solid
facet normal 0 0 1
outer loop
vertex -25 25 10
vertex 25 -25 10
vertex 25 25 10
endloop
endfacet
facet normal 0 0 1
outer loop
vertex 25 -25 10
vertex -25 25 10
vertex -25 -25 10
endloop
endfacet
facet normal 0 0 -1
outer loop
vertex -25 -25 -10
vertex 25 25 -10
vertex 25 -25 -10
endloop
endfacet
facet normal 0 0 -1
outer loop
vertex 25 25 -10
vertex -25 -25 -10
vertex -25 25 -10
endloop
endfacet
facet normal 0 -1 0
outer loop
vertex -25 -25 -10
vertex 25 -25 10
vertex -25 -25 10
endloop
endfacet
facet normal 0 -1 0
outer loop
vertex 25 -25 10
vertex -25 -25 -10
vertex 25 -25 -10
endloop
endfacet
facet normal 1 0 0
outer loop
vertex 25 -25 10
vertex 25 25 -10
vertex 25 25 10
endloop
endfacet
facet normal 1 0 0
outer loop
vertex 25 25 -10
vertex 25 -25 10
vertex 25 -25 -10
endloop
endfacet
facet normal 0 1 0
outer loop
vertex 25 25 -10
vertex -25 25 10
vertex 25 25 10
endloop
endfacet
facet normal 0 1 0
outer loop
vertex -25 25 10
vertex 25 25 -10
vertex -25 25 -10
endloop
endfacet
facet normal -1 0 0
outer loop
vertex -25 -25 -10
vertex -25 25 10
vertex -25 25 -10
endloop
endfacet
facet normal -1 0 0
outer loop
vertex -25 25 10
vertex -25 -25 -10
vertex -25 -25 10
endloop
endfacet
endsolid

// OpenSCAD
// Basic Project Scaffold for 3D Printing
// This template provides a starting point for beginner projects
// Complete the TODO sections to create your own design

// ============================================
// PROJECT CONFIGURATION
// ============================================

// TODO: Set your project name
project_name = "My First Project";

// TODO: Define overall dimensions (mm)
object_width = 50;
object_depth = 50;
object_height = 20;

// Wall thickness for strength (2-3mm recommended)
wall_thickness = 2;

// ============================================
// MATERIAL PROPERTIES
// ============================================

// Print resolution (0.2mm layers recommended)
$fn = 30;  // Fragment quality (higher = smoother curves, slower rendering)

// ============================================
// MAIN DESIGN
// ============================================

module base_shape() {
    // TODO: Replace this cube with your design
    cube([object_width, object_depth, object_height], center = true);
}

module hollow_version() {
    // Creates a hollow version by subtracting an inner cube
    difference() {
        base_shape();
        
        // Inner void (adjust padding as needed)
        translate([0, 0, 0.5])
            cube([object_width - 2*wall_thickness, 
                  object_depth - 2*wall_thickness, 
                  object_height - 2*wall_thickness], 
                 center = true);
    }
}

// ============================================
// OUTPUT OPTIONS
// ============================================

// TODO: Uncomment one of these to see different versions:

// Solid version
base_shape();

// Hollow version (useful for reducing material)
// hollow_version();

// ============================================
// CUSTOMIZATION TIPS
// ============================================
// 1. Test print at small scale first
// 2. Add support structures if needed
// 3. Use wall_thickness variable for quick adjustments
// 4. Check dimensions match your design intent
// 5. Consider printing orientation for strength
